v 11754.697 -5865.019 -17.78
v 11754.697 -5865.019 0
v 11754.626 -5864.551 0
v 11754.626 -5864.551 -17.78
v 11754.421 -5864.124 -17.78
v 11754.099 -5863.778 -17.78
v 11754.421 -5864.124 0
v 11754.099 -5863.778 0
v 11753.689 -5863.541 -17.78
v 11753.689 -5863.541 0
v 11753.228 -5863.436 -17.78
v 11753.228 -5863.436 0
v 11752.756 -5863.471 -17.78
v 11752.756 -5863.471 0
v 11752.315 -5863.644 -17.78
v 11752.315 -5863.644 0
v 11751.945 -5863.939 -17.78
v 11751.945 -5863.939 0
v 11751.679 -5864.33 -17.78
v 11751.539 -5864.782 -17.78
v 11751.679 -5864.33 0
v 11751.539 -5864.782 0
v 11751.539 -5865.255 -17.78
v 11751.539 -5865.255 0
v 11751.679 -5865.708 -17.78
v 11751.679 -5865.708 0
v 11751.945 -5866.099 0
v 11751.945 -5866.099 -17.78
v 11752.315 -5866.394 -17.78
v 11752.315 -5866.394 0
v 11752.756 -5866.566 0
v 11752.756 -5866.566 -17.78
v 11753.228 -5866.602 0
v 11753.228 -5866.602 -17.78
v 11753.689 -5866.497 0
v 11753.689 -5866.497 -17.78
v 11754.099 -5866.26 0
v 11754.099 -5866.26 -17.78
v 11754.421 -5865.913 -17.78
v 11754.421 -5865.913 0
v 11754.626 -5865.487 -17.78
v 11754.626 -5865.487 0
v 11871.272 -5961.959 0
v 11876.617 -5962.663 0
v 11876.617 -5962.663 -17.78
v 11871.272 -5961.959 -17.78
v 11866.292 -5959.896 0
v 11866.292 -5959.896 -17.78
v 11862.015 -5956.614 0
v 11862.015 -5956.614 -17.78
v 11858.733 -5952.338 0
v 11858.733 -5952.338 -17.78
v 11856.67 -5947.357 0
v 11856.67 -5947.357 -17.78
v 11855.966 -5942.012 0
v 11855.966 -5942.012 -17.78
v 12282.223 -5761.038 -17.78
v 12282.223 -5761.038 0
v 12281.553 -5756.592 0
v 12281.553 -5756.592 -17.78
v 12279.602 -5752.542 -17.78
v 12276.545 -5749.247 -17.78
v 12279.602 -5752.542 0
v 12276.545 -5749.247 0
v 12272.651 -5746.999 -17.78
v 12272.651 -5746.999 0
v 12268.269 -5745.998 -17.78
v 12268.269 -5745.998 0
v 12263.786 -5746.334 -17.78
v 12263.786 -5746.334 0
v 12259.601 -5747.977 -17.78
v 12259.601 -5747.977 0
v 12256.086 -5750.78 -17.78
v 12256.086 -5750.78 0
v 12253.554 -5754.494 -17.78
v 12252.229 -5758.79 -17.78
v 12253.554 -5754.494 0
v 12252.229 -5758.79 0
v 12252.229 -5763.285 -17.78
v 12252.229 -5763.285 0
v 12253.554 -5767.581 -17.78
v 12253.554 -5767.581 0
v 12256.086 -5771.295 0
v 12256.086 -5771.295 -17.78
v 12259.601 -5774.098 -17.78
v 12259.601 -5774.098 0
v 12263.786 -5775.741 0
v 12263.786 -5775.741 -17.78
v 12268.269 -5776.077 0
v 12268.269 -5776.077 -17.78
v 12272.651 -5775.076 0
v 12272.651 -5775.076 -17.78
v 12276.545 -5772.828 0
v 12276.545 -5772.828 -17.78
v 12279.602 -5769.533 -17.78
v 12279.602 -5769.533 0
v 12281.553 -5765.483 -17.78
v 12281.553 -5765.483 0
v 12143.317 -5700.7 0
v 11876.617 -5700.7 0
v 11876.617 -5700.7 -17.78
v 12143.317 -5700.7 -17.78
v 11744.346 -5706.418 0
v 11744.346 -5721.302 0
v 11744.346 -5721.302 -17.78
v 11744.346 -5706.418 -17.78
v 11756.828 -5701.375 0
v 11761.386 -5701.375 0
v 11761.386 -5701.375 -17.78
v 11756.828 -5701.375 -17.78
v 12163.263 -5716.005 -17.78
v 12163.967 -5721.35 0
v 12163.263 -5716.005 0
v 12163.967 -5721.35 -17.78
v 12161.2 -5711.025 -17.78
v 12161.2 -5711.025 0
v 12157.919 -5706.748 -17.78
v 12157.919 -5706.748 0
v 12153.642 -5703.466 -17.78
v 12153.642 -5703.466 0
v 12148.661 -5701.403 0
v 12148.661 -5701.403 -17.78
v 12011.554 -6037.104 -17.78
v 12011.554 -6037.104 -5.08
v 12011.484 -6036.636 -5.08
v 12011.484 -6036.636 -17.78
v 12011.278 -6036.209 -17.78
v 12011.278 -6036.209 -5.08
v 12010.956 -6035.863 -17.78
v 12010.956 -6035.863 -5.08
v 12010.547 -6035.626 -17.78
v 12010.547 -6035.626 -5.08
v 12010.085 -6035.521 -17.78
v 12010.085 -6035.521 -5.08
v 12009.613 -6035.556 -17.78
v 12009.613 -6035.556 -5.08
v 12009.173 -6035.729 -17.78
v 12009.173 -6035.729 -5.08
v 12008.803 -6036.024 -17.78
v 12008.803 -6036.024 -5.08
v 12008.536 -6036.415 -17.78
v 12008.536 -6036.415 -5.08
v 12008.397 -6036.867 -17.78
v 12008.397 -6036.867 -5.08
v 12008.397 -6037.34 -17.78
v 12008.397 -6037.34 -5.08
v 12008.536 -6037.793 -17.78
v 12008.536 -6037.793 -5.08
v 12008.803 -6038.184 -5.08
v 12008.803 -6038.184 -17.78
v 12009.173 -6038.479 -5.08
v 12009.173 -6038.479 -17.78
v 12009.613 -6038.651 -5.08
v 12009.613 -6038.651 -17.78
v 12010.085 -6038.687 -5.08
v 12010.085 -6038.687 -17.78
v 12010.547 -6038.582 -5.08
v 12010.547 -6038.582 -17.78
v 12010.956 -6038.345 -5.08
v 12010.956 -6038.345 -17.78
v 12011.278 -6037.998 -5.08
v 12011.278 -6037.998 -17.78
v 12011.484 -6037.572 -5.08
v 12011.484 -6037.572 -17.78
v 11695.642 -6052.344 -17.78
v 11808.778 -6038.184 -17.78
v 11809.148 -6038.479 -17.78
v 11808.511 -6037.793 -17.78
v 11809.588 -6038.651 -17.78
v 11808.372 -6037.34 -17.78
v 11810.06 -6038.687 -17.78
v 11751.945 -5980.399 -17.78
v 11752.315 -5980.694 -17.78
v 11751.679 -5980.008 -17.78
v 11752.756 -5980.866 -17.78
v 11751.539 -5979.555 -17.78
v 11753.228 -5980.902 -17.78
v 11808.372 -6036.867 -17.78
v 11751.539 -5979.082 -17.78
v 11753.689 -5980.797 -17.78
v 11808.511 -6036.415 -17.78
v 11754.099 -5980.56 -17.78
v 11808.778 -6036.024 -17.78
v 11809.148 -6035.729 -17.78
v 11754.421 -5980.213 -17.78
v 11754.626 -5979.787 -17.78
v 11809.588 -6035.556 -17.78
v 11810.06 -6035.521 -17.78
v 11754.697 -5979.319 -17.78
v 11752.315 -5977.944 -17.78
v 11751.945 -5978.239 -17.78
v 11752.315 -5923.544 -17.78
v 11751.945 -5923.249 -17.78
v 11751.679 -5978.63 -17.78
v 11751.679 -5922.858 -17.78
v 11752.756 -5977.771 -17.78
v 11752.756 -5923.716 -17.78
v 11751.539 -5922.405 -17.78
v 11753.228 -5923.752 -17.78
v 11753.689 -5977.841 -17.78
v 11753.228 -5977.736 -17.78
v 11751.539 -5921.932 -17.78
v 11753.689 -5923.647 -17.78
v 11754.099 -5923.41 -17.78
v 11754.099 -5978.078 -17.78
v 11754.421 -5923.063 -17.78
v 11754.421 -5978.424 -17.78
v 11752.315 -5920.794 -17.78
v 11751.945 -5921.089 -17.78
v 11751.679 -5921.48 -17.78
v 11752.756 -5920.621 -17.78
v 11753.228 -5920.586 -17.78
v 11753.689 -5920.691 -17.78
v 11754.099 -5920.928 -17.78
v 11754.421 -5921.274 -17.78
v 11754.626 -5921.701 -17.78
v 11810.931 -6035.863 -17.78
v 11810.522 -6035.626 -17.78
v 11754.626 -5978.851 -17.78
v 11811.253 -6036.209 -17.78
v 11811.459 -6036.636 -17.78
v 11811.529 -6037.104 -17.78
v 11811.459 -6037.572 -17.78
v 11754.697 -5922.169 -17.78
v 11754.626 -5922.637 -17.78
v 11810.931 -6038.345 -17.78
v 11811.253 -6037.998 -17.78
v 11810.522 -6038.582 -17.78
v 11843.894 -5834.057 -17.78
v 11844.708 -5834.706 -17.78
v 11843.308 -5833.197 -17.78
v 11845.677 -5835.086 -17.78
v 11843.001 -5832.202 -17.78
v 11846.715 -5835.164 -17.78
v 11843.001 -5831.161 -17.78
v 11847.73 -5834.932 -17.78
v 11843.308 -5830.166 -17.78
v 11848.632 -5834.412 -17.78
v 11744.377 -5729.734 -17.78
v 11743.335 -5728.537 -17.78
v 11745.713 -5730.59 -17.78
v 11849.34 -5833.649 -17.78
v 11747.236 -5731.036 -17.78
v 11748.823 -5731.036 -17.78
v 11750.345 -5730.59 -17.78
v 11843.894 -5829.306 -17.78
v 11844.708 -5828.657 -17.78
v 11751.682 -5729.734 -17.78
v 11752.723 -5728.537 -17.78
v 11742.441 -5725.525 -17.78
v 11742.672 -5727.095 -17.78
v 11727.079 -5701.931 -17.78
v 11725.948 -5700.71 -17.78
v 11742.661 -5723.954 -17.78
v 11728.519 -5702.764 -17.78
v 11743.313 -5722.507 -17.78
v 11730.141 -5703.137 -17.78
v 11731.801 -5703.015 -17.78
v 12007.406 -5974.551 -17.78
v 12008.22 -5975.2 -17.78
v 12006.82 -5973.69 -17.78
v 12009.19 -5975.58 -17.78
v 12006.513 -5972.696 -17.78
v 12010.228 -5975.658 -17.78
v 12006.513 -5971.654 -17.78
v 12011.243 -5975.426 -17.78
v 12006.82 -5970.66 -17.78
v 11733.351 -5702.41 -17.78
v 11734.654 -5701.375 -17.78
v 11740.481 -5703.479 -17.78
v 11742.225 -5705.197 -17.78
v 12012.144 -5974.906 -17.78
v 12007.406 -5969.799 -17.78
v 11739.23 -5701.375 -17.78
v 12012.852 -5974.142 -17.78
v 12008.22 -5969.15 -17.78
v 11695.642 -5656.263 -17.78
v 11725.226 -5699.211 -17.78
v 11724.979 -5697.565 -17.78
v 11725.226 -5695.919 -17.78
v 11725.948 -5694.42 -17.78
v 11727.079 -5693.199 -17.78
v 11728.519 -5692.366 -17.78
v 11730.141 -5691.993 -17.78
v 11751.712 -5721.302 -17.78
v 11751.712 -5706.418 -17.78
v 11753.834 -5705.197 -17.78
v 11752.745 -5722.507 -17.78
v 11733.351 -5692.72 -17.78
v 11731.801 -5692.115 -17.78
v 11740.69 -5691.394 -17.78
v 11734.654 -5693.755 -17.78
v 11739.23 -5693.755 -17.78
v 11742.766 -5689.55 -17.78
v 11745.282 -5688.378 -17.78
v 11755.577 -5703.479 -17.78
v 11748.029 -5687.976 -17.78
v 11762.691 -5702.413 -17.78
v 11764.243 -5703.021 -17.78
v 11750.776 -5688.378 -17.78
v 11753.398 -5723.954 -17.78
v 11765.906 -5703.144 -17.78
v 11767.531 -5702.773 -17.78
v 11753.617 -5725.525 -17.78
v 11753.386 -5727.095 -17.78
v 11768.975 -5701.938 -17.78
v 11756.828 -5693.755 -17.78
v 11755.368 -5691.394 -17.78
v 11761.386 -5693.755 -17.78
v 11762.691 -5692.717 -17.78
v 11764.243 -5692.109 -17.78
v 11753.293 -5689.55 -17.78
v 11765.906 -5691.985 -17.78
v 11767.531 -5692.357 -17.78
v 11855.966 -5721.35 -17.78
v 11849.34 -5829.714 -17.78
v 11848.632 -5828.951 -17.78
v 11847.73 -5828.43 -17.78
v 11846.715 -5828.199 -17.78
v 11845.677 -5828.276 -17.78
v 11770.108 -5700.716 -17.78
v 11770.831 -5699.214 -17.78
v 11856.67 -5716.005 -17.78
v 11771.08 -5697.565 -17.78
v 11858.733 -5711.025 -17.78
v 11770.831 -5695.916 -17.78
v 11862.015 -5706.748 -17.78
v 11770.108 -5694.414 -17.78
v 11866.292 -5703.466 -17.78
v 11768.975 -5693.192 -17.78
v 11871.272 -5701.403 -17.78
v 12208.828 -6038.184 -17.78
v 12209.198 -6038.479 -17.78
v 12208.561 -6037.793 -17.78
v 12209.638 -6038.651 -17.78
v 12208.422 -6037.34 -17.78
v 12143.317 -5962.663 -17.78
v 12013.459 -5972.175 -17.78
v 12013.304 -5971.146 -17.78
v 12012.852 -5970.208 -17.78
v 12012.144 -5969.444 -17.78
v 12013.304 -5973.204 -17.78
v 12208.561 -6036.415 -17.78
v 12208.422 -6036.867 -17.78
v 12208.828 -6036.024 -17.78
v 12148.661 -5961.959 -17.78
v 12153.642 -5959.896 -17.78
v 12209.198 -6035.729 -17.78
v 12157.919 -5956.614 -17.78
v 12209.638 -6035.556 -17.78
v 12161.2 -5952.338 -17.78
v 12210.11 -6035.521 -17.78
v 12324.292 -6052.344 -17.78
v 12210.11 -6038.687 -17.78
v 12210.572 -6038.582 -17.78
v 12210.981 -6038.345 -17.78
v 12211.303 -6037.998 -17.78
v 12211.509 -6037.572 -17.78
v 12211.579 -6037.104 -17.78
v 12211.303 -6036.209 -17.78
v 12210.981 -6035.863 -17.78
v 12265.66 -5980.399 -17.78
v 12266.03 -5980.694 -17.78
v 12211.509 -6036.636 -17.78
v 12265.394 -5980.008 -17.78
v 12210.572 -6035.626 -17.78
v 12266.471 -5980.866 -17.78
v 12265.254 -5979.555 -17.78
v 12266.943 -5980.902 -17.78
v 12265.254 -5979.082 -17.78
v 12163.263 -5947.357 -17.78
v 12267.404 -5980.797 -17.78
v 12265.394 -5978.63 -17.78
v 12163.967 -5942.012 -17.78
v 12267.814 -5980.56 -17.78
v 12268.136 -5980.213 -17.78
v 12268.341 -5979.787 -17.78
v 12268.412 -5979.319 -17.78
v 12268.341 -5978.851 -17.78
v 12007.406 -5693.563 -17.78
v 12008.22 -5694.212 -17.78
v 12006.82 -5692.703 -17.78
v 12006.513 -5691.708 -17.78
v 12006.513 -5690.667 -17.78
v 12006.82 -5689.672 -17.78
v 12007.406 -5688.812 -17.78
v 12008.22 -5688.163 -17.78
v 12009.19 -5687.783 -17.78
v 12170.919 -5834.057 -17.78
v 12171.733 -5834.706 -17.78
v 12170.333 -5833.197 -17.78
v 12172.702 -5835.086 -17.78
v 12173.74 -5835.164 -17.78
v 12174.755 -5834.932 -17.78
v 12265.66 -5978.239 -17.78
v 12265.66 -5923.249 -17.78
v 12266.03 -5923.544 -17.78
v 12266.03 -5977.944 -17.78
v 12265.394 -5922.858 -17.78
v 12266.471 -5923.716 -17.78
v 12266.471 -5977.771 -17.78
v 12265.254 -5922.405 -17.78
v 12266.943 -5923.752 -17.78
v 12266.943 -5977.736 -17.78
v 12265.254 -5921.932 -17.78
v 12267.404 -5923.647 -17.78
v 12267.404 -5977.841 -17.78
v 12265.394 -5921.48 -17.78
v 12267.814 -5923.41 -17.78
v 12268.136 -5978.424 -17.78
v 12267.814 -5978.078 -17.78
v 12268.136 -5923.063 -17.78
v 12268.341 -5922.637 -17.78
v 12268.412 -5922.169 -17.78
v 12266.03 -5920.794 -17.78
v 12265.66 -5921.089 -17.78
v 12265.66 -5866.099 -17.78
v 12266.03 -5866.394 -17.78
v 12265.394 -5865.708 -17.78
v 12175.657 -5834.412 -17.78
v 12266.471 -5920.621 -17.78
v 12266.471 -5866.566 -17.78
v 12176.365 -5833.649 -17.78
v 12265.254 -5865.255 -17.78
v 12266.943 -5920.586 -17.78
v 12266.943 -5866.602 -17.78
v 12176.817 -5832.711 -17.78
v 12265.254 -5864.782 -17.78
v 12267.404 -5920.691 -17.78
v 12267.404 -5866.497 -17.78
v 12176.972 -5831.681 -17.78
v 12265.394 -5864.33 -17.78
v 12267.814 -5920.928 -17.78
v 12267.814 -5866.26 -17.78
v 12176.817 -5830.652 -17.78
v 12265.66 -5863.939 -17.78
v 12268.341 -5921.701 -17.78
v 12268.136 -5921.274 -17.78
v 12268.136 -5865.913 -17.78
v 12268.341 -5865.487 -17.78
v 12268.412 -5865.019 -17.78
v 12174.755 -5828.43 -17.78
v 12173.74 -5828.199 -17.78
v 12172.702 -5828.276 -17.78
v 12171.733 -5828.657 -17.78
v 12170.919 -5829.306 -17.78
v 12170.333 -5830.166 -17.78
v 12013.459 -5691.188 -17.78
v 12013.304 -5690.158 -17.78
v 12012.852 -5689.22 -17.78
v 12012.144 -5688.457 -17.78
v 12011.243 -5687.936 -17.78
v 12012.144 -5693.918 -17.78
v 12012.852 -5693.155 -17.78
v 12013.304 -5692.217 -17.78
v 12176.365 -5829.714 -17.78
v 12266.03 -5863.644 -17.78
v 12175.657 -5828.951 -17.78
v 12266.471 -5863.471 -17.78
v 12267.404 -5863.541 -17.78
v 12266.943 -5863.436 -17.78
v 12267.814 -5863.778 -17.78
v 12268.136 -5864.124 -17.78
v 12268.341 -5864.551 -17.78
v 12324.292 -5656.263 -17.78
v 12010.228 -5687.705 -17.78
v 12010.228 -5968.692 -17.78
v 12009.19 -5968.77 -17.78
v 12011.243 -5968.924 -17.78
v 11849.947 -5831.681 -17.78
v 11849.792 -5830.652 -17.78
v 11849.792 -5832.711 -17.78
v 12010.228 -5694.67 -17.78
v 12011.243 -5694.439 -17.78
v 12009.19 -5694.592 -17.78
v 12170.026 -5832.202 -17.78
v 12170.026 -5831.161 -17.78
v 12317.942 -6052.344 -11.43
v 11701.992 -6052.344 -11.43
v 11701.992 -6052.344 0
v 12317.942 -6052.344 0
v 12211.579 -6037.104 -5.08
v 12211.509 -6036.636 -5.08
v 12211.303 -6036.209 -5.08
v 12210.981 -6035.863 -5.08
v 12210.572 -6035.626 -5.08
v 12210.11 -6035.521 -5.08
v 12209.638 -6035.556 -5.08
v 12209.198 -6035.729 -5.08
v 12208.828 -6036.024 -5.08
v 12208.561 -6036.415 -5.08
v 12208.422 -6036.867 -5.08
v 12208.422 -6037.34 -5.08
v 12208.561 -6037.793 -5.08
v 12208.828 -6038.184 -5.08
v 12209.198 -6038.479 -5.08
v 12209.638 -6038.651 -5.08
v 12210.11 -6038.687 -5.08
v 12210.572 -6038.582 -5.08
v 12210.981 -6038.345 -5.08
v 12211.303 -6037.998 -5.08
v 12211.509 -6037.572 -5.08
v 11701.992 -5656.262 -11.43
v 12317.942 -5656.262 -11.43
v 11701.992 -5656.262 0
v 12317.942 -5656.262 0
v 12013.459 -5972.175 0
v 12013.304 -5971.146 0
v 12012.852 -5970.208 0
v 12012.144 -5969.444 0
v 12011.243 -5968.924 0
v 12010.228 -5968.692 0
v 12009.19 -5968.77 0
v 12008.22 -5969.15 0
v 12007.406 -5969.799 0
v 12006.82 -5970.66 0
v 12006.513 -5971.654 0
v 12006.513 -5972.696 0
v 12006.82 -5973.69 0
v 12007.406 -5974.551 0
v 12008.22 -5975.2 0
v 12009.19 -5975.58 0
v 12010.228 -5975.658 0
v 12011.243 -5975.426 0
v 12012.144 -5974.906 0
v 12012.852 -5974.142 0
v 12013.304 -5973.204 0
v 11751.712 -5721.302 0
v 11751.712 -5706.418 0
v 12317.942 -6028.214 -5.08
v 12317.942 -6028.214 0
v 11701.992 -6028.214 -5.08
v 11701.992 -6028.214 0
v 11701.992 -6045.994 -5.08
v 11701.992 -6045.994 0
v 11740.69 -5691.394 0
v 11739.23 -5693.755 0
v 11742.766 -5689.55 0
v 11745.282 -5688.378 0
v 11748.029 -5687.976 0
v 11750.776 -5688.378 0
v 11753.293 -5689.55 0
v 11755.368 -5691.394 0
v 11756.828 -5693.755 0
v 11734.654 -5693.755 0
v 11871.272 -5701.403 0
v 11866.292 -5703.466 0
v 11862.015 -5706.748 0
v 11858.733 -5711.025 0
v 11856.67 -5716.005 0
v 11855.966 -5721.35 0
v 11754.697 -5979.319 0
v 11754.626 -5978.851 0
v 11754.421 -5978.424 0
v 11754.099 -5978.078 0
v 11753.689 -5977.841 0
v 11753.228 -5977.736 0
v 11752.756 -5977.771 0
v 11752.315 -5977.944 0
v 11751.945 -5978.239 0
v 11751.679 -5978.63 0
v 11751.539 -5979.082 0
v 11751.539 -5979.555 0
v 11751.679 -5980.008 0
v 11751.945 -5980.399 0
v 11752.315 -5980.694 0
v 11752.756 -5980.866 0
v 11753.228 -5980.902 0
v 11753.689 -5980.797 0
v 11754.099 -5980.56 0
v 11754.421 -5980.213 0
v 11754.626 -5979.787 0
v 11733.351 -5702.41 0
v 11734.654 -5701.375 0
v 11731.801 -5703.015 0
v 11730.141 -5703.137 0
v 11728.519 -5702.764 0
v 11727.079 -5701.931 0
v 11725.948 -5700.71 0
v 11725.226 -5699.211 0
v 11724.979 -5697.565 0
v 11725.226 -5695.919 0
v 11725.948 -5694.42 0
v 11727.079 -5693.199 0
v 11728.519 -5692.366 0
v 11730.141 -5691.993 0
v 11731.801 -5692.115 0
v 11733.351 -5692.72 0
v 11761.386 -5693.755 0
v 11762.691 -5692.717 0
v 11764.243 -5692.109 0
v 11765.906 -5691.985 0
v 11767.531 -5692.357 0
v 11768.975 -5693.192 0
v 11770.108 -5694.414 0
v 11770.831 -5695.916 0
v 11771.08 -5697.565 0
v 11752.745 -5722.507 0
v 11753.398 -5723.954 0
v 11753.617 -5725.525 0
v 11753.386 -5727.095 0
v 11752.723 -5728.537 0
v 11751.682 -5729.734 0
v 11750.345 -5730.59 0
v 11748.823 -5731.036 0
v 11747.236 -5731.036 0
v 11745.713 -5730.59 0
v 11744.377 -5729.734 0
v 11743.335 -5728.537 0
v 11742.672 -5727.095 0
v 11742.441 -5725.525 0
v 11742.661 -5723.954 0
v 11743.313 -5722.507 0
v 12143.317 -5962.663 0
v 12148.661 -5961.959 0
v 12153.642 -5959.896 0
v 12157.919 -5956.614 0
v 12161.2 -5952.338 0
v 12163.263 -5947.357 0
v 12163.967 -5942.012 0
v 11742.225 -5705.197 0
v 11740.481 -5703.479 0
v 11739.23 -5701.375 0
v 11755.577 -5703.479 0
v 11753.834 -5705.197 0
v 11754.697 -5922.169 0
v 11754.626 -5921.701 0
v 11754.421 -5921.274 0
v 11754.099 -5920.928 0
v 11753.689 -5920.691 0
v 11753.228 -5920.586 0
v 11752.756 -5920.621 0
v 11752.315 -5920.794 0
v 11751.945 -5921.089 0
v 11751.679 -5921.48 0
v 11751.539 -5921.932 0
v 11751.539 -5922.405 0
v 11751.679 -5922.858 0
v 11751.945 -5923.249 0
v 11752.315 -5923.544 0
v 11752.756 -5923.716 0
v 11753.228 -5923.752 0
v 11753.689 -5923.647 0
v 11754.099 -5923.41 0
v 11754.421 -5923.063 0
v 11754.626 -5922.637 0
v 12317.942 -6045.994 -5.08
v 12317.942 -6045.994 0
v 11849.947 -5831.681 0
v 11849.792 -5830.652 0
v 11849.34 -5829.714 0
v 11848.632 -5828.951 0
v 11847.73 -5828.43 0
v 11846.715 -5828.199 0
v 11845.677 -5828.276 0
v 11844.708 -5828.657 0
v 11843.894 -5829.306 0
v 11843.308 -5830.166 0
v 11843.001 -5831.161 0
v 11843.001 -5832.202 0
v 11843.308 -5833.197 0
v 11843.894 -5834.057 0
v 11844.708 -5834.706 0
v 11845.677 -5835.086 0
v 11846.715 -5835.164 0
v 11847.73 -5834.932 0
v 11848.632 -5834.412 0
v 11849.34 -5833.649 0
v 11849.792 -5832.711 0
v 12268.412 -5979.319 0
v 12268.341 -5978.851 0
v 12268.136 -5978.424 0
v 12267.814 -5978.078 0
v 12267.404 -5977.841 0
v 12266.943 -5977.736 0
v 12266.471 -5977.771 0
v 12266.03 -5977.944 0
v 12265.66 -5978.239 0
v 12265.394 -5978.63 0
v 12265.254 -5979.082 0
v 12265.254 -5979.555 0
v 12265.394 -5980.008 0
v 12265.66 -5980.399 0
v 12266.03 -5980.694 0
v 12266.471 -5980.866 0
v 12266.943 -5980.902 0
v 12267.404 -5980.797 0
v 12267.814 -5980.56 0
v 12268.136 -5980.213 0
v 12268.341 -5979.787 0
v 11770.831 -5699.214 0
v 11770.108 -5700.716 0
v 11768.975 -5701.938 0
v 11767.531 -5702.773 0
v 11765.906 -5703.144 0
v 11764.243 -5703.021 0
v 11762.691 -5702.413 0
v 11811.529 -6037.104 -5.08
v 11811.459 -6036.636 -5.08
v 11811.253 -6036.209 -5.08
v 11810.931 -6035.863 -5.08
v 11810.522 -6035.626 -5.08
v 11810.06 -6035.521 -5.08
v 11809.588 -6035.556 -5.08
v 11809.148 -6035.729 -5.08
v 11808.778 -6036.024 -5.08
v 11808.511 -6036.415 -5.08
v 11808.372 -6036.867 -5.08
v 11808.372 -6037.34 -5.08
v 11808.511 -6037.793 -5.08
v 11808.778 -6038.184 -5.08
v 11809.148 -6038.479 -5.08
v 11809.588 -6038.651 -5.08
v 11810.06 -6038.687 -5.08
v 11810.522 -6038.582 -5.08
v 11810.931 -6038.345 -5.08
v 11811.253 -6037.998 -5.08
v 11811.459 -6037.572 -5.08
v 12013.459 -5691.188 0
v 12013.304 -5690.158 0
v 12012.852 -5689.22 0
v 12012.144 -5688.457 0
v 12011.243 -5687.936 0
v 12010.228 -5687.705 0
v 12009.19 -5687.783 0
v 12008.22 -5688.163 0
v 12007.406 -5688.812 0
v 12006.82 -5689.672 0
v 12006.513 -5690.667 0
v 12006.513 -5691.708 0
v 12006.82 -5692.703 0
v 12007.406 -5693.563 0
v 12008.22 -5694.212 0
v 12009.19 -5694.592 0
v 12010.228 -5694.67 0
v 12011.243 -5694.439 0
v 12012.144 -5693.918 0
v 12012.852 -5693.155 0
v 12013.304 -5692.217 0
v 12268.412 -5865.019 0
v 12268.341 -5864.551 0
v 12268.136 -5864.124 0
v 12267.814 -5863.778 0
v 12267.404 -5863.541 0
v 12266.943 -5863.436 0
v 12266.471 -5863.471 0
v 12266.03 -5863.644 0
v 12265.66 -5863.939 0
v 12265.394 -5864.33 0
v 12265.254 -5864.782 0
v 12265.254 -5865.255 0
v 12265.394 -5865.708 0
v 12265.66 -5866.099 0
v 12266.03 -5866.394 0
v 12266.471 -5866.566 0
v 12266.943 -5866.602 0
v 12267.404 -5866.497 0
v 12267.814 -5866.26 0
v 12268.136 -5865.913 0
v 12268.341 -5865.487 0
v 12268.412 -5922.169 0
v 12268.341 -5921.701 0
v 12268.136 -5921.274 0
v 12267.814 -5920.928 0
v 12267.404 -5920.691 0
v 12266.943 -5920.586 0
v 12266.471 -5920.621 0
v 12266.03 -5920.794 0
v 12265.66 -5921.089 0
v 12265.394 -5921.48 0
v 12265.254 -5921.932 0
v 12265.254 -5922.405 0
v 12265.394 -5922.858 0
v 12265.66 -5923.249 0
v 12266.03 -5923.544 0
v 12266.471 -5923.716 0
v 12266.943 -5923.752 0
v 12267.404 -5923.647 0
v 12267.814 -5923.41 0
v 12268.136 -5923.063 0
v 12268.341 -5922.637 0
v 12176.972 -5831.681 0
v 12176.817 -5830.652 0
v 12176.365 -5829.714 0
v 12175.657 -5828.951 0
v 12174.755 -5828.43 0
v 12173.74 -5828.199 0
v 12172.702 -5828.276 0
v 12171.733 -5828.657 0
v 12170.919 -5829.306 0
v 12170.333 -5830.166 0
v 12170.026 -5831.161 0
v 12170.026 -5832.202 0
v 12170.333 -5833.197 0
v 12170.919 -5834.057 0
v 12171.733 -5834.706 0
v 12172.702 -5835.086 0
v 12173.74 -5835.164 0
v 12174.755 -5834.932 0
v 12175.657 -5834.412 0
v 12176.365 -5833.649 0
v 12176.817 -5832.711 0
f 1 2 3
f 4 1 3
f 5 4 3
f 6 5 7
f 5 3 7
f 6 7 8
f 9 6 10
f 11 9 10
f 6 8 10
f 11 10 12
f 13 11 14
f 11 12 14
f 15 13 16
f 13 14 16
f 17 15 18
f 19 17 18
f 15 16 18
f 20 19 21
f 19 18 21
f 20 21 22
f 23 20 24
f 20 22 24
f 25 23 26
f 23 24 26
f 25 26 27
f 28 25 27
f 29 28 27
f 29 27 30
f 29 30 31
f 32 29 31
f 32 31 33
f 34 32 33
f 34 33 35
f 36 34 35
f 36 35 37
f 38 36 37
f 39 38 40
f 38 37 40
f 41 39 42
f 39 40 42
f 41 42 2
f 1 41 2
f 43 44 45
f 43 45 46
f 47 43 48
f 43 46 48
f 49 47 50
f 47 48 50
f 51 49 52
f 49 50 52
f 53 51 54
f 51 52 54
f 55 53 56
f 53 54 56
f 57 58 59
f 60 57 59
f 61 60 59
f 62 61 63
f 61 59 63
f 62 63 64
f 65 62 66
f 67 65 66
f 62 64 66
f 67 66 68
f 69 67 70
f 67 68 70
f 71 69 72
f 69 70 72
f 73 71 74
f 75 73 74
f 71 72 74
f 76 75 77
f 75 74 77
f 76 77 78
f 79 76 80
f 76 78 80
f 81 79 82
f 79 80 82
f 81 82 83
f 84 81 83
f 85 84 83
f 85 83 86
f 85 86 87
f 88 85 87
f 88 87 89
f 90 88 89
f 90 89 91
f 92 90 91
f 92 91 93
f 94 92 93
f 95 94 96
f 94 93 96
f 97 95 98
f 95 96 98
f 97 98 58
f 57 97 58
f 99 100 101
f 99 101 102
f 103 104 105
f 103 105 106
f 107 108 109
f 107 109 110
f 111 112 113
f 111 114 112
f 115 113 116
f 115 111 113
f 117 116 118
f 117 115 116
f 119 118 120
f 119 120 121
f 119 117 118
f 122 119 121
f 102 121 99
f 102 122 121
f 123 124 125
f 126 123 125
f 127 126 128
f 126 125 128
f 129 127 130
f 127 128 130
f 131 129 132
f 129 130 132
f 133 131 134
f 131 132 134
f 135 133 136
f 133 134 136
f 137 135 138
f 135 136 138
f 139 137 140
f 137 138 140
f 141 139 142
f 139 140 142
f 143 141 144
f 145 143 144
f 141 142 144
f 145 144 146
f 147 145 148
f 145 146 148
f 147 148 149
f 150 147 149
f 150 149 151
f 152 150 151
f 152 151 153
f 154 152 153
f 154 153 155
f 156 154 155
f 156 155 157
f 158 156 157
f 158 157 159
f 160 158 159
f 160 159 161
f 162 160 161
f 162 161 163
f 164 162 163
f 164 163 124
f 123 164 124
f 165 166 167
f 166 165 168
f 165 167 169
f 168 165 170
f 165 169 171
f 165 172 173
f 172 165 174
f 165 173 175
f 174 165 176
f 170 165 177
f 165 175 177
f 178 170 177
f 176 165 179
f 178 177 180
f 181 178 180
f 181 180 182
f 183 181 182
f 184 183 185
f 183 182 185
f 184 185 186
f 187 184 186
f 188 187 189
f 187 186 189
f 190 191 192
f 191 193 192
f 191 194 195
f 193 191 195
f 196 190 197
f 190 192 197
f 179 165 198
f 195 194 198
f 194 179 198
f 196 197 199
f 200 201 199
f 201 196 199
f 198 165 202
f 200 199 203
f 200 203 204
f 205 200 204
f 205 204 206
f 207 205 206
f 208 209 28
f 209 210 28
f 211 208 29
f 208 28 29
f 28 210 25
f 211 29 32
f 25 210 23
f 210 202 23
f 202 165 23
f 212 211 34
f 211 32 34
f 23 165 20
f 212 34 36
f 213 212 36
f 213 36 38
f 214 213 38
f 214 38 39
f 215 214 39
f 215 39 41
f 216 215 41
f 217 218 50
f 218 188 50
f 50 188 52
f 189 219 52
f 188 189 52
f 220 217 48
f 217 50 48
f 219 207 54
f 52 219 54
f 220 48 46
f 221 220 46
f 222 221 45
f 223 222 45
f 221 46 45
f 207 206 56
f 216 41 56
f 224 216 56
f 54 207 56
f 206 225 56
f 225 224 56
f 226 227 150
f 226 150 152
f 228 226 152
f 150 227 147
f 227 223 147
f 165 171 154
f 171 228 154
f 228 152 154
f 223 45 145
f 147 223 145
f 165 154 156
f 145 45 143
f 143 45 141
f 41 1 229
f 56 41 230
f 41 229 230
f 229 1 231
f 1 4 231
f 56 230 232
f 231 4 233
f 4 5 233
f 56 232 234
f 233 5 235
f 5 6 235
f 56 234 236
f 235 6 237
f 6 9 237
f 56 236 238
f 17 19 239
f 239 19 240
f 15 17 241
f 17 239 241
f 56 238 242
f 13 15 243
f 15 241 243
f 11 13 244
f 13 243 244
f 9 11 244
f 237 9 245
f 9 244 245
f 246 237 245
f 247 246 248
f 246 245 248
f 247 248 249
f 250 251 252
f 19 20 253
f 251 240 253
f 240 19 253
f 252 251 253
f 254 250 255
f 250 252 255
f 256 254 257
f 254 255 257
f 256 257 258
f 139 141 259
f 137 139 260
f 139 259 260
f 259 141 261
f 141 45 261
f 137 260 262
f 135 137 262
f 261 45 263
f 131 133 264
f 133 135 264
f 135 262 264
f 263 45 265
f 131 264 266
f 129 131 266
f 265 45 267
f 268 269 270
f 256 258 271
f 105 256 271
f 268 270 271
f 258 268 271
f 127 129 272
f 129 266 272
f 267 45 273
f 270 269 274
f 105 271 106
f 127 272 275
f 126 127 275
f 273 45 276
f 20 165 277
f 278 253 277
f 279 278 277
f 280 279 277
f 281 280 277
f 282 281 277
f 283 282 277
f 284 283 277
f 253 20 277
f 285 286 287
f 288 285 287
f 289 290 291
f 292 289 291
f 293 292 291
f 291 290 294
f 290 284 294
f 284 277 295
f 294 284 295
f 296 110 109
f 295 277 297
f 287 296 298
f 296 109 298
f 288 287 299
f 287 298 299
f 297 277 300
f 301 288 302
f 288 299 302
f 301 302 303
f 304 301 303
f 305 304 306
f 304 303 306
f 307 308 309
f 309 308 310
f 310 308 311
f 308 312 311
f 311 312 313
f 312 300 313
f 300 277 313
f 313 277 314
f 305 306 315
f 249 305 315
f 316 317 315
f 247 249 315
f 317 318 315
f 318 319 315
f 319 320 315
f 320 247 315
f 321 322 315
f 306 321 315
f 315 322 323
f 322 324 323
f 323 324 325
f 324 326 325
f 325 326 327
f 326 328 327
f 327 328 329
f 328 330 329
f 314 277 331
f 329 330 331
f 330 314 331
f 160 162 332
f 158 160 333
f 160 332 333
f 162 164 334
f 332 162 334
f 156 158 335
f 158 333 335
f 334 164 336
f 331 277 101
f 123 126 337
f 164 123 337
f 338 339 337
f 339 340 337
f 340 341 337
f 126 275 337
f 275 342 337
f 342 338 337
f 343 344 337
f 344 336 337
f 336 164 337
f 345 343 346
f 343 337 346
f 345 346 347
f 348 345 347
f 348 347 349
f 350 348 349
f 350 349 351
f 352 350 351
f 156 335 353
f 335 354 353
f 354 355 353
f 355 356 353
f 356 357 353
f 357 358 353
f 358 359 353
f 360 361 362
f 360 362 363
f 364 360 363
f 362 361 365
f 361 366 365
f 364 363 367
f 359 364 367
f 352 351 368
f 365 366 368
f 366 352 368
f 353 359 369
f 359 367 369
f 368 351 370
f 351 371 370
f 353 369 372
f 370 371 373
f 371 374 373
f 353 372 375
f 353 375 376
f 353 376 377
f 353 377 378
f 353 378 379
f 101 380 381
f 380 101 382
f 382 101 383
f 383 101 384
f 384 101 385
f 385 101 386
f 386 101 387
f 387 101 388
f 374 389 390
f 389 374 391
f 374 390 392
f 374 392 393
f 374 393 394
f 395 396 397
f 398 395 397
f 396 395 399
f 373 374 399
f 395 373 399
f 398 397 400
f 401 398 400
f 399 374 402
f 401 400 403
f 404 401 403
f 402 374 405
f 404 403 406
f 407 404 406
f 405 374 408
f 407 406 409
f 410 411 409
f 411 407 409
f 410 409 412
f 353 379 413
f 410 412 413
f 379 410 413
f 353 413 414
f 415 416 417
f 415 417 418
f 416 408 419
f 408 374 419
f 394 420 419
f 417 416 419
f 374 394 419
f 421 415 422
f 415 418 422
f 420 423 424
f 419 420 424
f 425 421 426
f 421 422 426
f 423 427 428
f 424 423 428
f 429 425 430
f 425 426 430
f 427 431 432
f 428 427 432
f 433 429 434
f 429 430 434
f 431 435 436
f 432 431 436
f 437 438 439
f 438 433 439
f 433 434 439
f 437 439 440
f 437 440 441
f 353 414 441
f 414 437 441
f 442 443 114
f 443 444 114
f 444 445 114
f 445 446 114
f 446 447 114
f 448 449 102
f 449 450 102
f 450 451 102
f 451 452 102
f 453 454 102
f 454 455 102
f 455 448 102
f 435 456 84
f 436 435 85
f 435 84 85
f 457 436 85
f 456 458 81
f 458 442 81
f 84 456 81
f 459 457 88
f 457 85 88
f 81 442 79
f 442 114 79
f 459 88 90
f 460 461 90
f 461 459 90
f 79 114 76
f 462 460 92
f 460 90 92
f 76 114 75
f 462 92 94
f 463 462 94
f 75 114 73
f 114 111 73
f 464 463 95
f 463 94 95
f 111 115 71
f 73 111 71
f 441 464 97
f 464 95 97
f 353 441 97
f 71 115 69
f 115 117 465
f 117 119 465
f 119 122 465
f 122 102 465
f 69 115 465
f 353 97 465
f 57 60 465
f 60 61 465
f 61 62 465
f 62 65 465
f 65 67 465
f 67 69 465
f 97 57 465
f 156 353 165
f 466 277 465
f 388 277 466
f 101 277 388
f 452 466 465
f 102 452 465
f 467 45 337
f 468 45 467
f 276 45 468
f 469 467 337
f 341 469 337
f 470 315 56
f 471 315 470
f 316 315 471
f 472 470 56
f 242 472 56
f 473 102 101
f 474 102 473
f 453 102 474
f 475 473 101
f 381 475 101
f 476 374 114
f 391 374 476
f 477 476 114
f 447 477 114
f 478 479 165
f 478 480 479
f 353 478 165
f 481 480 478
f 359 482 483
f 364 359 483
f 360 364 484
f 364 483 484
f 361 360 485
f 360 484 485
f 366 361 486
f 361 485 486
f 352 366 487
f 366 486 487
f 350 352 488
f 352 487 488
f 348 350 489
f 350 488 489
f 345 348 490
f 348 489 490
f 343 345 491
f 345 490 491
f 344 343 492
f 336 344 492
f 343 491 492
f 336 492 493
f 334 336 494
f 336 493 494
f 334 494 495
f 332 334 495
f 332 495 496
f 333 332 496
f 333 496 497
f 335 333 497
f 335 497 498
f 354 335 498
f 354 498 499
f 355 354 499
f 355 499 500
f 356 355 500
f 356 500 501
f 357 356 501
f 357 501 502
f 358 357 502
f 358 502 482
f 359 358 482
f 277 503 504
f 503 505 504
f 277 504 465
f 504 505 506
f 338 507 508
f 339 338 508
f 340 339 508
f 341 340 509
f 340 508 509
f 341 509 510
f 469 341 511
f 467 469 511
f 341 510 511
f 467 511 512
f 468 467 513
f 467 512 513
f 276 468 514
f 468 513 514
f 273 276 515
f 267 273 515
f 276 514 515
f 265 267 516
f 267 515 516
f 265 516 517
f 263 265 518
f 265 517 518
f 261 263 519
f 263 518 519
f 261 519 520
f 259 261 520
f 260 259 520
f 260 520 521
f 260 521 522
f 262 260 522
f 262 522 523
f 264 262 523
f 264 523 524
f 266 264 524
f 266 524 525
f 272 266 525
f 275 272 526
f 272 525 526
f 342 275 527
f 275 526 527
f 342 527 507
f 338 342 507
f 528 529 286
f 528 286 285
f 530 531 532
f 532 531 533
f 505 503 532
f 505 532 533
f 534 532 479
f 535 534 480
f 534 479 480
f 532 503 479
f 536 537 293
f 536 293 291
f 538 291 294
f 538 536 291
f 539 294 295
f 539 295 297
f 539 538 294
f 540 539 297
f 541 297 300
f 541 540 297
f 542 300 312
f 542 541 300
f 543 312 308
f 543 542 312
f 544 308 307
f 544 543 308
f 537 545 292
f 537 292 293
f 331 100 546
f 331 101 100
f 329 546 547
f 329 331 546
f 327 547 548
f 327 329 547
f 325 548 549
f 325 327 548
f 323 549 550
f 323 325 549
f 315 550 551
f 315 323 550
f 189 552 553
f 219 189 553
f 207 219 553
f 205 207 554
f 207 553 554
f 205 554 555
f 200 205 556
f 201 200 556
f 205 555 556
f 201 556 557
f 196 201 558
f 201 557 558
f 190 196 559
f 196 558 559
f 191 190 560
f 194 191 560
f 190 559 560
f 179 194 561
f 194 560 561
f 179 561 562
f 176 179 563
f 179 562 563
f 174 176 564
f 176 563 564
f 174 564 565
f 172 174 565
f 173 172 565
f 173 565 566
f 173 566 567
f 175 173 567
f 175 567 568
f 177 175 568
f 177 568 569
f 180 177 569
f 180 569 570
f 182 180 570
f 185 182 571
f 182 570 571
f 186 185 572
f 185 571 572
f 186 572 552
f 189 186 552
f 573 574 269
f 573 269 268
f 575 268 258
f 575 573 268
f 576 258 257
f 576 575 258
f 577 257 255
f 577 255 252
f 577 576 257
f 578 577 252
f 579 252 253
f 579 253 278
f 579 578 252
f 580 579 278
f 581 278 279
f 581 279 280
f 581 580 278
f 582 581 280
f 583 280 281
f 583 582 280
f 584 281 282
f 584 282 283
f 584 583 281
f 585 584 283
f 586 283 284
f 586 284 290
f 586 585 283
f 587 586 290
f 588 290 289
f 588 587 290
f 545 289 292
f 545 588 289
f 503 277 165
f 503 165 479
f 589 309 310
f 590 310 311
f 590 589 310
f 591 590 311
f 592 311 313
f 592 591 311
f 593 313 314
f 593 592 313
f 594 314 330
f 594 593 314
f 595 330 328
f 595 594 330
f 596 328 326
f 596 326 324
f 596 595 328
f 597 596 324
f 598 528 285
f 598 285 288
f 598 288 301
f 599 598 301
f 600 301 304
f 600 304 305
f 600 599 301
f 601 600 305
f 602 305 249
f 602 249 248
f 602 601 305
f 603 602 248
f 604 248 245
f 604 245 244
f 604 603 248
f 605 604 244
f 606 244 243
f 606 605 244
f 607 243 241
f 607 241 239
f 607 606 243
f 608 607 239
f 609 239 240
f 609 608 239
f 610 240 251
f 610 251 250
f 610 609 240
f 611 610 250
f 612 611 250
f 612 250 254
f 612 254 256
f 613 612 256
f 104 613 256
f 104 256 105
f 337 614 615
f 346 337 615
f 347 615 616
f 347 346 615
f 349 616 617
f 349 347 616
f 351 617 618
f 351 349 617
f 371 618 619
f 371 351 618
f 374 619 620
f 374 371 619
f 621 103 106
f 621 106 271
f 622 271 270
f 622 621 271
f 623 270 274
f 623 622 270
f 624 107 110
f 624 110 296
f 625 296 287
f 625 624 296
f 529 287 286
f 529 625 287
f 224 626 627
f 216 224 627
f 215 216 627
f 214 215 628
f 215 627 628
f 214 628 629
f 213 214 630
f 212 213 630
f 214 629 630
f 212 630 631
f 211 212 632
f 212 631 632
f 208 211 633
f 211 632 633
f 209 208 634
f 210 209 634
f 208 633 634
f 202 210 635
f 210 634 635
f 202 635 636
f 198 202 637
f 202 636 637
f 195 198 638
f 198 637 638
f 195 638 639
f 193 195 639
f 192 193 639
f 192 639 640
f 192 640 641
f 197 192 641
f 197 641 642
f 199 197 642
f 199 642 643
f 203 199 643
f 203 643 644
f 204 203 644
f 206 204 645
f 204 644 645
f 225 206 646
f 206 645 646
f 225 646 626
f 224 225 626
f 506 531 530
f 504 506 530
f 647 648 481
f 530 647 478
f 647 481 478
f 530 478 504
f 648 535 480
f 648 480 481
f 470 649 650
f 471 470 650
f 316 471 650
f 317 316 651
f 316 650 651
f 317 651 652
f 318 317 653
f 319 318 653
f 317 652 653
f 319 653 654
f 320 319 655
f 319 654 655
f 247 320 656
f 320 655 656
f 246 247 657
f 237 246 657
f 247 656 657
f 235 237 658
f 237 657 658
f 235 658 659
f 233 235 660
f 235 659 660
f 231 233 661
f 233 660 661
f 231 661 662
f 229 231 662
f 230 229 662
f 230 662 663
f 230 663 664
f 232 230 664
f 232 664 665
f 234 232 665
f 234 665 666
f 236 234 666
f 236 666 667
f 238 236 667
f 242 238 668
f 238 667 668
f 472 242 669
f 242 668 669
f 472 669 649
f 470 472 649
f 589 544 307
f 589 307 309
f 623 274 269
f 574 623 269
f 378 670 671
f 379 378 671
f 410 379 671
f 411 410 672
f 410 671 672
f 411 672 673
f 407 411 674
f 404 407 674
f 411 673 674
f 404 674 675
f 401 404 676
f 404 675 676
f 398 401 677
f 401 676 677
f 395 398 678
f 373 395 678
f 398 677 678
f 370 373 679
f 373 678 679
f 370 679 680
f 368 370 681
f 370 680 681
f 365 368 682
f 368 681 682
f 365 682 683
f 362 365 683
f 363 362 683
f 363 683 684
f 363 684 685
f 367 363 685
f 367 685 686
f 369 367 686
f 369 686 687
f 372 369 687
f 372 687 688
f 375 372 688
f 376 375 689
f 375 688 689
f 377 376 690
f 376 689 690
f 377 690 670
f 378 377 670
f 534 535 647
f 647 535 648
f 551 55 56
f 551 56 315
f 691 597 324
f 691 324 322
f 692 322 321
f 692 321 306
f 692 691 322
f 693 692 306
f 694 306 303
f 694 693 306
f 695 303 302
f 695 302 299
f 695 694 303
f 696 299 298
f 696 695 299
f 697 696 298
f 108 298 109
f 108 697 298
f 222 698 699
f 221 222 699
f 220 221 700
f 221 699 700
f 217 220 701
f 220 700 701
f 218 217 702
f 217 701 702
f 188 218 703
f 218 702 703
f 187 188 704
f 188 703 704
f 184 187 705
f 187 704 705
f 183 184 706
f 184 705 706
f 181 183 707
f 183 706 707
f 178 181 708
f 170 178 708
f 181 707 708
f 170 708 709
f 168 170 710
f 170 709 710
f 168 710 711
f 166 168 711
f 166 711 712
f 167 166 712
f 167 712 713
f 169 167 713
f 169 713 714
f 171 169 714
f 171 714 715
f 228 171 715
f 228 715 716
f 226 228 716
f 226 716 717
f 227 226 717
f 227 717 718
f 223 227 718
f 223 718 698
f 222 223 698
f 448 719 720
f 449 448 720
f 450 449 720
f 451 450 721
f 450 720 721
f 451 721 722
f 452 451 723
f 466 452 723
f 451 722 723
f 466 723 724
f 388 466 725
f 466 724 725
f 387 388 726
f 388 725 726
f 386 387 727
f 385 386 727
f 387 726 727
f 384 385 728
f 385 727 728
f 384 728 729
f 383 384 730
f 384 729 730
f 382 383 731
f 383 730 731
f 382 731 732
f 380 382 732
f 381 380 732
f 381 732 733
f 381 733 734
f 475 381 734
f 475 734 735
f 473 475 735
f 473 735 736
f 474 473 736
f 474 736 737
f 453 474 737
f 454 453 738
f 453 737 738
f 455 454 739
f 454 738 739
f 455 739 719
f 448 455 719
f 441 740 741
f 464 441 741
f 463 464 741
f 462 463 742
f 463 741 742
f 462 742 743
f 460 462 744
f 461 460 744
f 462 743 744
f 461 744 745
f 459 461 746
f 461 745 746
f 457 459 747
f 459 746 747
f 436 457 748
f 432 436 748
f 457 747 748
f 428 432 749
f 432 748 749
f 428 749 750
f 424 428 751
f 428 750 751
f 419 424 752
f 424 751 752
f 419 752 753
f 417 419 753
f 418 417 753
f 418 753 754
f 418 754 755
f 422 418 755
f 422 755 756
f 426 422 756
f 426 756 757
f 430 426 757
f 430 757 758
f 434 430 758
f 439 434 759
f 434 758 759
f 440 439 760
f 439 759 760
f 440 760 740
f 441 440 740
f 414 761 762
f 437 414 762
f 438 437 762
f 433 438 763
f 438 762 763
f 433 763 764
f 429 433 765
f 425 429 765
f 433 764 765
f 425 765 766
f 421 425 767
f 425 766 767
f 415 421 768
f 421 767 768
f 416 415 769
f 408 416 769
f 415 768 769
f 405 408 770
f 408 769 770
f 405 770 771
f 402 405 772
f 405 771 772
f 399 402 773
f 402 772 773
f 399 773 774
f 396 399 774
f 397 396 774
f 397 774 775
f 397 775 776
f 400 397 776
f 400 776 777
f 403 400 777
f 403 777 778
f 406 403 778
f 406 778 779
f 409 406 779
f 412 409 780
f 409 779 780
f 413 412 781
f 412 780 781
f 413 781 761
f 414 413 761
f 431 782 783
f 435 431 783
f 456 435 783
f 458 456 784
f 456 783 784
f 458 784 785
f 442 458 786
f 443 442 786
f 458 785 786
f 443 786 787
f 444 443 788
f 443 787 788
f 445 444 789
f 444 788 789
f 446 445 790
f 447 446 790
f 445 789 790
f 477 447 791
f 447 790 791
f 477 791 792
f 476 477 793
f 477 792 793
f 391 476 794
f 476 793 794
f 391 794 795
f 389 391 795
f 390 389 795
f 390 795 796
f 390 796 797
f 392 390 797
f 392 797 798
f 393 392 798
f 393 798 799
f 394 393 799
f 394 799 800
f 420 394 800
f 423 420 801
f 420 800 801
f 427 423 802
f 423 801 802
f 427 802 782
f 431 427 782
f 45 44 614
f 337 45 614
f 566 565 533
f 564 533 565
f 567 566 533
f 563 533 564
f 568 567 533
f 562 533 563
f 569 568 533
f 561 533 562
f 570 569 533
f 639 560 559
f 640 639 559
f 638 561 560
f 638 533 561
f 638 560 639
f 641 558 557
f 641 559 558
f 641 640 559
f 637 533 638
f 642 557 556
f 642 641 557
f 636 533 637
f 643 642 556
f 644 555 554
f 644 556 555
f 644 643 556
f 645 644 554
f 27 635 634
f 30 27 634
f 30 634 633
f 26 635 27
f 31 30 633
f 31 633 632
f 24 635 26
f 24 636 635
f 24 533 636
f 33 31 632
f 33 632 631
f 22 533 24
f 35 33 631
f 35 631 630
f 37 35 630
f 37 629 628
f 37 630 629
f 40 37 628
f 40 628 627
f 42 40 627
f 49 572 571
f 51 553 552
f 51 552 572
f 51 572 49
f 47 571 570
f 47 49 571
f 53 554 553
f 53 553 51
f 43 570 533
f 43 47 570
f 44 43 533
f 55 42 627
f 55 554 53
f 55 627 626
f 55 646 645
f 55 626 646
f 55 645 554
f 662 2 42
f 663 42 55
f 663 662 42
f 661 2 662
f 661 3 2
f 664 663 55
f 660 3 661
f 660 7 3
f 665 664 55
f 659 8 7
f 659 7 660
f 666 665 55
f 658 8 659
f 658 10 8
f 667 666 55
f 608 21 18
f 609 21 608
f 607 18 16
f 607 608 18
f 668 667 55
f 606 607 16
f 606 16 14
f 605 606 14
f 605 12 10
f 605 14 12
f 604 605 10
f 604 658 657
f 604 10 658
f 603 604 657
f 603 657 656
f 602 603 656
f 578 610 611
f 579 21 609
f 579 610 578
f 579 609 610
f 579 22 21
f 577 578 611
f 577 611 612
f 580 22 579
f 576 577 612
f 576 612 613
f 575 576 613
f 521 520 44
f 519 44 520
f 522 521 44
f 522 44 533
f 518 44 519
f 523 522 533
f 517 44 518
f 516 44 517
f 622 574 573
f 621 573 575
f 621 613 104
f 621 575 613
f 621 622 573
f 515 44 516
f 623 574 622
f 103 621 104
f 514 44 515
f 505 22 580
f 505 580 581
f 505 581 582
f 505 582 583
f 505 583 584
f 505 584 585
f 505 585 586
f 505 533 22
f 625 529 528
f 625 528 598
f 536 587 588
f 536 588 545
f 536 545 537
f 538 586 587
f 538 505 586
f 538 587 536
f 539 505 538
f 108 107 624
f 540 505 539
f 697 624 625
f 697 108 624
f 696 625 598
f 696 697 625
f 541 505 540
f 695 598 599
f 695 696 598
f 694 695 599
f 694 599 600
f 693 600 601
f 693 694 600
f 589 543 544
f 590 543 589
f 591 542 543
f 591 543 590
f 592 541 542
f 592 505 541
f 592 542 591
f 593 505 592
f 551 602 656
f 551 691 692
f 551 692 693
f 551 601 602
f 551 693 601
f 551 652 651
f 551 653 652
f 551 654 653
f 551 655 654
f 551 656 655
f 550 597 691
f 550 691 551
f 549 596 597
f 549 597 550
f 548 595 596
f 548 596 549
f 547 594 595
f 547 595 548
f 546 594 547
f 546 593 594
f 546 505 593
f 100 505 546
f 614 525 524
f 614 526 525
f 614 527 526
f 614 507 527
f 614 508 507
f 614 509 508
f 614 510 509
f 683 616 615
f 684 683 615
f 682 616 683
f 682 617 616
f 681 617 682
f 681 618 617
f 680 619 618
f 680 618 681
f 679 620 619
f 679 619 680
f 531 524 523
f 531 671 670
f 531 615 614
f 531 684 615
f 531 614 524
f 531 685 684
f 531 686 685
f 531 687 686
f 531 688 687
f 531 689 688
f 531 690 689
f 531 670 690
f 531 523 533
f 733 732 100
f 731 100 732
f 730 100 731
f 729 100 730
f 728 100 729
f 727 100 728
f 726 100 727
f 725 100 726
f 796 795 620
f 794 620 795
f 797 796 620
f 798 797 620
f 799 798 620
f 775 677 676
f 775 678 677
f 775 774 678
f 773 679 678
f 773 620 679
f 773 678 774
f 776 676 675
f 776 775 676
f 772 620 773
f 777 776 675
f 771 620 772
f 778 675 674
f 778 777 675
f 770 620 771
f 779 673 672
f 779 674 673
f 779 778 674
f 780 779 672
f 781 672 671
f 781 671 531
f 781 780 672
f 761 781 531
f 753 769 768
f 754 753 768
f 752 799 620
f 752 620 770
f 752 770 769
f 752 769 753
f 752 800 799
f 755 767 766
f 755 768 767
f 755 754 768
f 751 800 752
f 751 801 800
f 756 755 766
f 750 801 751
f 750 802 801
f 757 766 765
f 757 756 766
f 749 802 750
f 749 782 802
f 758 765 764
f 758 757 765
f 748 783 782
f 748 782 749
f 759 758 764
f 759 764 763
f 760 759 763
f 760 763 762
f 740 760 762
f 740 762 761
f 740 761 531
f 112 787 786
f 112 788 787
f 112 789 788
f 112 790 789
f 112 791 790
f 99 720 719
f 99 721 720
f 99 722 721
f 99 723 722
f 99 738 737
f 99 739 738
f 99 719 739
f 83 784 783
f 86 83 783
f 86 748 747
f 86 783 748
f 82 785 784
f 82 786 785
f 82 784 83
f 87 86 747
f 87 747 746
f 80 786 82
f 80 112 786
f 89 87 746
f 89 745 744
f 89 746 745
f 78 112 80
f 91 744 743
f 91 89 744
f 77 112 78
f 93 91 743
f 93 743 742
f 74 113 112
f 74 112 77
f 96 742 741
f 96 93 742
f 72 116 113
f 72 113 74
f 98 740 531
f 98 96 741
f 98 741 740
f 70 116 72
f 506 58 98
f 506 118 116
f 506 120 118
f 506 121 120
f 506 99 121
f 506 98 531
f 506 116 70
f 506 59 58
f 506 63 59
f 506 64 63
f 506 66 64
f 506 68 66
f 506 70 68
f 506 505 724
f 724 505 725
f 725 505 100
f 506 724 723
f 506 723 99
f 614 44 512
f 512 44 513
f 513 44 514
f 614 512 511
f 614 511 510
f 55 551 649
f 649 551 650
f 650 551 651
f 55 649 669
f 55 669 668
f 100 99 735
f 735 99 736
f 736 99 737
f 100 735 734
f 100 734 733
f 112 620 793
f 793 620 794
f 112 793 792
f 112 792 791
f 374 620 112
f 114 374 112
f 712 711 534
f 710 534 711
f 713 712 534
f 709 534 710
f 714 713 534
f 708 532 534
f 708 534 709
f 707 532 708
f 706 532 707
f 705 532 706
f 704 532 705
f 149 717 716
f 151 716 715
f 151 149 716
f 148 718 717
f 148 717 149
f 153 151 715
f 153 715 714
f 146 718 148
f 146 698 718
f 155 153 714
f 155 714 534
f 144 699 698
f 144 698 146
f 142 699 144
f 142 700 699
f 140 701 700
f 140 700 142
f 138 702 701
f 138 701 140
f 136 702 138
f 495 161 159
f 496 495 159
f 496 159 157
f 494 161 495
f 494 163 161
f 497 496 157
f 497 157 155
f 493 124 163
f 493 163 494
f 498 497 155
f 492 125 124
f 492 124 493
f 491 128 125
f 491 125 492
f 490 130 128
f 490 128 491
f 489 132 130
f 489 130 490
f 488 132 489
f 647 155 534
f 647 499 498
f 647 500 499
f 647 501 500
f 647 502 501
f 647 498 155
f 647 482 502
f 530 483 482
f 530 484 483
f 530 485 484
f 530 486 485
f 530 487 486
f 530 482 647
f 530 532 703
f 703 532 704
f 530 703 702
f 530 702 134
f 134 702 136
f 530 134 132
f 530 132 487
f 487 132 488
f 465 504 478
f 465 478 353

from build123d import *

# Parameters (mm, degrees)
SKETCH2_W          = 628.65
SKETCH2_H          = 396.08125
EXTRUDE1_DEPTH     = 17.78
SKETCH3_R          = 15.08125
SKETCH3_R_2        = 3.4925
SKETCH3_R_3        = 1.5875
SKETCH3_W          = 308.0004
SKETCH3_H          = 261.9629
CUT_EXTRUDE1_DEPTH = 17.78
CUT_EXTRUDE2_DEPTH = 5.08
CUT_EXTRUDE4_DEPTH = 396.08125
FILLET1_R          = 20.6502


with BuildPart() as part:
    # Sketch2 → Extrude1 (new body)
    with BuildSketch(Plane.XY):
        with Locations((12009.966666666, -5854.303125)):
            Rectangle(SKETCH2_W, SKETCH2_H)
    extrude(amount=-EXTRUDE1_DEPTH)

    # Sketch3 → Cut-Extrude1 (cut)
    with BuildSketch(Plane.XY):
        with Locations((12267.141666666, -5761.0375)):
            Circle(SKETCH3_R)
        with Locations((12173.479166666, -5831.68125)):
            Circle(SKETCH3_R_2)
        with Locations((12266.824166666, -5865.01875)):
            Circle(SKETCH3_R_3)
        with Locations((12266.824166666, -5922.16875)):
            Circle(SKETCH3_R_3)
        with Locations((12266.824166666, -5979.31875)):
            Circle(SKETCH3_R_3)
        with Locations((12209.991666666, -6037.10375)):
            Circle(SKETCH3_R_3)
        with Locations((12009.966666666, -6037.10375)):
            Circle(SKETCH3_R_3)
        with Locations((11809.941666666, -6037.10375)):
            Circle(SKETCH3_R_3)
        with Locations((11753.109166666, -5979.31875)):
            Circle(SKETCH3_R_3)
        with Locations((11753.109166666, -5922.16875)):
            Circle(SKETCH3_R_3)
        with Locations((11753.109166666, -5865.01875)):
            Circle(SKETCH3_R_3)
        with Locations((11846.454166666, -5831.68125)):
            Circle(SKETCH3_R_2)
        with Locations((12009.966666666, -5972.175)):
            Circle(SKETCH3_R_2)
        with Locations((12009.966666666, -5691.1875)):
            Circle(SKETCH3_R_2)
        with Locations((12009.966666666, -5831.68125)):
            Rectangle(SKETCH3_W, SKETCH3_H)
        with BuildLine():
            Line((11734.654409808, -5693.754968556), (11739.23011943, -5693.754968556))
            ThreePointArc((11739.23011943, -5693.754968556), (11748.029166666, -5687.976468556), (11756.828213901, -5693.754968556))
            Line((11756.828213901, -5693.754968556), (11761.386355753, -5693.754968556))
            ThreePointArc((11761.386355753, -5693.754968556), (11767.531113043, -5692.357368906), (11771.079666666, -5697.564968556))
            ThreePointArc((11771.079666666, -5697.564968556), (11767.531113043, -5702.772568206), (11761.386355753, -5701.374968556))
            Line((11761.386355753, -5701.374968556), (11756.828213901, -5701.374968556))
            ThreePointArc((11756.828213901, -5701.374968556), (11754.760305425, -5704.393665595), (11751.712166666, -5706.417925308))
            Line((11751.712166666, -5706.417925308), (11751.712166666, -5721.30243896))
            ThreePointArc((11751.712166666, -5721.30243896), (11748.029166666, -5731.092968556), (11744.346166666, -5721.30243896))
            Line((11744.346166666, -5721.30243896), (11744.346166666, -5706.417925308))
            ThreePointArc((11744.346166666, -5706.417925308), (11741.298027907, -5704.393665595), (11739.23011943, -5701.374968556))
            Line((11739.23011943, -5701.374968556), (11734.654409809, -5701.374968556))
            ThreePointArc((11734.654409809, -5701.374968556), (11724.978666666, -5697.564968556), (11734.654409808, -5693.754968556))
        make_face()
    extrude(amount=-CUT_EXTRUDE1_DEPTH, mode=Mode.SUBTRACT)

    # Sketch4 → Cut-Extrude2 (cut)
    with BuildSketch(Plane.XY):
        Polygon((11975.041666666, -6028.21375), (11695.641666666, -6028.21375), (11695.641666666, -6045.99375), (12324.291666666, -6045.99375), (12324.291666666, -6028.21375), align=None)
    extrude(amount=-CUT_EXTRUDE2_DEPTH, mode=Mode.SUBTRACT)

    # Sketch7 → Cut-Extrude4 (cut)
    with BuildSketch(Plane.XZ.offset(6052.34375)):
        Polygon((11701.991666666, -11.43), (11701.991666666, 0), (11695.641666666, 0), (11695.641666666, -17.78), align=None)
        Polygon((12317.941666666, -11.43), (12324.291666666, -17.78), (12324.291666666, 0), (12317.941666666, 0), align=None)
    extrude(amount=-CUT_EXTRUDE4_DEPTH, mode=Mode.SUBTRACT)

    # Fillet1
    fillet1_edges = [part.edges().sort_by_distance(p)[0] for p in [
        (11855.966466666, -5962.6627, -8.89),
        (11855.966466666, -5700.6998, -8.89),
        (12163.966866666, -5700.6998, -8.89),
        (12163.966866666, -5962.6627, -8.89),
    ]]
    fillet(fillet1_edges, radius=FILLET1_R)


solid = part.part
